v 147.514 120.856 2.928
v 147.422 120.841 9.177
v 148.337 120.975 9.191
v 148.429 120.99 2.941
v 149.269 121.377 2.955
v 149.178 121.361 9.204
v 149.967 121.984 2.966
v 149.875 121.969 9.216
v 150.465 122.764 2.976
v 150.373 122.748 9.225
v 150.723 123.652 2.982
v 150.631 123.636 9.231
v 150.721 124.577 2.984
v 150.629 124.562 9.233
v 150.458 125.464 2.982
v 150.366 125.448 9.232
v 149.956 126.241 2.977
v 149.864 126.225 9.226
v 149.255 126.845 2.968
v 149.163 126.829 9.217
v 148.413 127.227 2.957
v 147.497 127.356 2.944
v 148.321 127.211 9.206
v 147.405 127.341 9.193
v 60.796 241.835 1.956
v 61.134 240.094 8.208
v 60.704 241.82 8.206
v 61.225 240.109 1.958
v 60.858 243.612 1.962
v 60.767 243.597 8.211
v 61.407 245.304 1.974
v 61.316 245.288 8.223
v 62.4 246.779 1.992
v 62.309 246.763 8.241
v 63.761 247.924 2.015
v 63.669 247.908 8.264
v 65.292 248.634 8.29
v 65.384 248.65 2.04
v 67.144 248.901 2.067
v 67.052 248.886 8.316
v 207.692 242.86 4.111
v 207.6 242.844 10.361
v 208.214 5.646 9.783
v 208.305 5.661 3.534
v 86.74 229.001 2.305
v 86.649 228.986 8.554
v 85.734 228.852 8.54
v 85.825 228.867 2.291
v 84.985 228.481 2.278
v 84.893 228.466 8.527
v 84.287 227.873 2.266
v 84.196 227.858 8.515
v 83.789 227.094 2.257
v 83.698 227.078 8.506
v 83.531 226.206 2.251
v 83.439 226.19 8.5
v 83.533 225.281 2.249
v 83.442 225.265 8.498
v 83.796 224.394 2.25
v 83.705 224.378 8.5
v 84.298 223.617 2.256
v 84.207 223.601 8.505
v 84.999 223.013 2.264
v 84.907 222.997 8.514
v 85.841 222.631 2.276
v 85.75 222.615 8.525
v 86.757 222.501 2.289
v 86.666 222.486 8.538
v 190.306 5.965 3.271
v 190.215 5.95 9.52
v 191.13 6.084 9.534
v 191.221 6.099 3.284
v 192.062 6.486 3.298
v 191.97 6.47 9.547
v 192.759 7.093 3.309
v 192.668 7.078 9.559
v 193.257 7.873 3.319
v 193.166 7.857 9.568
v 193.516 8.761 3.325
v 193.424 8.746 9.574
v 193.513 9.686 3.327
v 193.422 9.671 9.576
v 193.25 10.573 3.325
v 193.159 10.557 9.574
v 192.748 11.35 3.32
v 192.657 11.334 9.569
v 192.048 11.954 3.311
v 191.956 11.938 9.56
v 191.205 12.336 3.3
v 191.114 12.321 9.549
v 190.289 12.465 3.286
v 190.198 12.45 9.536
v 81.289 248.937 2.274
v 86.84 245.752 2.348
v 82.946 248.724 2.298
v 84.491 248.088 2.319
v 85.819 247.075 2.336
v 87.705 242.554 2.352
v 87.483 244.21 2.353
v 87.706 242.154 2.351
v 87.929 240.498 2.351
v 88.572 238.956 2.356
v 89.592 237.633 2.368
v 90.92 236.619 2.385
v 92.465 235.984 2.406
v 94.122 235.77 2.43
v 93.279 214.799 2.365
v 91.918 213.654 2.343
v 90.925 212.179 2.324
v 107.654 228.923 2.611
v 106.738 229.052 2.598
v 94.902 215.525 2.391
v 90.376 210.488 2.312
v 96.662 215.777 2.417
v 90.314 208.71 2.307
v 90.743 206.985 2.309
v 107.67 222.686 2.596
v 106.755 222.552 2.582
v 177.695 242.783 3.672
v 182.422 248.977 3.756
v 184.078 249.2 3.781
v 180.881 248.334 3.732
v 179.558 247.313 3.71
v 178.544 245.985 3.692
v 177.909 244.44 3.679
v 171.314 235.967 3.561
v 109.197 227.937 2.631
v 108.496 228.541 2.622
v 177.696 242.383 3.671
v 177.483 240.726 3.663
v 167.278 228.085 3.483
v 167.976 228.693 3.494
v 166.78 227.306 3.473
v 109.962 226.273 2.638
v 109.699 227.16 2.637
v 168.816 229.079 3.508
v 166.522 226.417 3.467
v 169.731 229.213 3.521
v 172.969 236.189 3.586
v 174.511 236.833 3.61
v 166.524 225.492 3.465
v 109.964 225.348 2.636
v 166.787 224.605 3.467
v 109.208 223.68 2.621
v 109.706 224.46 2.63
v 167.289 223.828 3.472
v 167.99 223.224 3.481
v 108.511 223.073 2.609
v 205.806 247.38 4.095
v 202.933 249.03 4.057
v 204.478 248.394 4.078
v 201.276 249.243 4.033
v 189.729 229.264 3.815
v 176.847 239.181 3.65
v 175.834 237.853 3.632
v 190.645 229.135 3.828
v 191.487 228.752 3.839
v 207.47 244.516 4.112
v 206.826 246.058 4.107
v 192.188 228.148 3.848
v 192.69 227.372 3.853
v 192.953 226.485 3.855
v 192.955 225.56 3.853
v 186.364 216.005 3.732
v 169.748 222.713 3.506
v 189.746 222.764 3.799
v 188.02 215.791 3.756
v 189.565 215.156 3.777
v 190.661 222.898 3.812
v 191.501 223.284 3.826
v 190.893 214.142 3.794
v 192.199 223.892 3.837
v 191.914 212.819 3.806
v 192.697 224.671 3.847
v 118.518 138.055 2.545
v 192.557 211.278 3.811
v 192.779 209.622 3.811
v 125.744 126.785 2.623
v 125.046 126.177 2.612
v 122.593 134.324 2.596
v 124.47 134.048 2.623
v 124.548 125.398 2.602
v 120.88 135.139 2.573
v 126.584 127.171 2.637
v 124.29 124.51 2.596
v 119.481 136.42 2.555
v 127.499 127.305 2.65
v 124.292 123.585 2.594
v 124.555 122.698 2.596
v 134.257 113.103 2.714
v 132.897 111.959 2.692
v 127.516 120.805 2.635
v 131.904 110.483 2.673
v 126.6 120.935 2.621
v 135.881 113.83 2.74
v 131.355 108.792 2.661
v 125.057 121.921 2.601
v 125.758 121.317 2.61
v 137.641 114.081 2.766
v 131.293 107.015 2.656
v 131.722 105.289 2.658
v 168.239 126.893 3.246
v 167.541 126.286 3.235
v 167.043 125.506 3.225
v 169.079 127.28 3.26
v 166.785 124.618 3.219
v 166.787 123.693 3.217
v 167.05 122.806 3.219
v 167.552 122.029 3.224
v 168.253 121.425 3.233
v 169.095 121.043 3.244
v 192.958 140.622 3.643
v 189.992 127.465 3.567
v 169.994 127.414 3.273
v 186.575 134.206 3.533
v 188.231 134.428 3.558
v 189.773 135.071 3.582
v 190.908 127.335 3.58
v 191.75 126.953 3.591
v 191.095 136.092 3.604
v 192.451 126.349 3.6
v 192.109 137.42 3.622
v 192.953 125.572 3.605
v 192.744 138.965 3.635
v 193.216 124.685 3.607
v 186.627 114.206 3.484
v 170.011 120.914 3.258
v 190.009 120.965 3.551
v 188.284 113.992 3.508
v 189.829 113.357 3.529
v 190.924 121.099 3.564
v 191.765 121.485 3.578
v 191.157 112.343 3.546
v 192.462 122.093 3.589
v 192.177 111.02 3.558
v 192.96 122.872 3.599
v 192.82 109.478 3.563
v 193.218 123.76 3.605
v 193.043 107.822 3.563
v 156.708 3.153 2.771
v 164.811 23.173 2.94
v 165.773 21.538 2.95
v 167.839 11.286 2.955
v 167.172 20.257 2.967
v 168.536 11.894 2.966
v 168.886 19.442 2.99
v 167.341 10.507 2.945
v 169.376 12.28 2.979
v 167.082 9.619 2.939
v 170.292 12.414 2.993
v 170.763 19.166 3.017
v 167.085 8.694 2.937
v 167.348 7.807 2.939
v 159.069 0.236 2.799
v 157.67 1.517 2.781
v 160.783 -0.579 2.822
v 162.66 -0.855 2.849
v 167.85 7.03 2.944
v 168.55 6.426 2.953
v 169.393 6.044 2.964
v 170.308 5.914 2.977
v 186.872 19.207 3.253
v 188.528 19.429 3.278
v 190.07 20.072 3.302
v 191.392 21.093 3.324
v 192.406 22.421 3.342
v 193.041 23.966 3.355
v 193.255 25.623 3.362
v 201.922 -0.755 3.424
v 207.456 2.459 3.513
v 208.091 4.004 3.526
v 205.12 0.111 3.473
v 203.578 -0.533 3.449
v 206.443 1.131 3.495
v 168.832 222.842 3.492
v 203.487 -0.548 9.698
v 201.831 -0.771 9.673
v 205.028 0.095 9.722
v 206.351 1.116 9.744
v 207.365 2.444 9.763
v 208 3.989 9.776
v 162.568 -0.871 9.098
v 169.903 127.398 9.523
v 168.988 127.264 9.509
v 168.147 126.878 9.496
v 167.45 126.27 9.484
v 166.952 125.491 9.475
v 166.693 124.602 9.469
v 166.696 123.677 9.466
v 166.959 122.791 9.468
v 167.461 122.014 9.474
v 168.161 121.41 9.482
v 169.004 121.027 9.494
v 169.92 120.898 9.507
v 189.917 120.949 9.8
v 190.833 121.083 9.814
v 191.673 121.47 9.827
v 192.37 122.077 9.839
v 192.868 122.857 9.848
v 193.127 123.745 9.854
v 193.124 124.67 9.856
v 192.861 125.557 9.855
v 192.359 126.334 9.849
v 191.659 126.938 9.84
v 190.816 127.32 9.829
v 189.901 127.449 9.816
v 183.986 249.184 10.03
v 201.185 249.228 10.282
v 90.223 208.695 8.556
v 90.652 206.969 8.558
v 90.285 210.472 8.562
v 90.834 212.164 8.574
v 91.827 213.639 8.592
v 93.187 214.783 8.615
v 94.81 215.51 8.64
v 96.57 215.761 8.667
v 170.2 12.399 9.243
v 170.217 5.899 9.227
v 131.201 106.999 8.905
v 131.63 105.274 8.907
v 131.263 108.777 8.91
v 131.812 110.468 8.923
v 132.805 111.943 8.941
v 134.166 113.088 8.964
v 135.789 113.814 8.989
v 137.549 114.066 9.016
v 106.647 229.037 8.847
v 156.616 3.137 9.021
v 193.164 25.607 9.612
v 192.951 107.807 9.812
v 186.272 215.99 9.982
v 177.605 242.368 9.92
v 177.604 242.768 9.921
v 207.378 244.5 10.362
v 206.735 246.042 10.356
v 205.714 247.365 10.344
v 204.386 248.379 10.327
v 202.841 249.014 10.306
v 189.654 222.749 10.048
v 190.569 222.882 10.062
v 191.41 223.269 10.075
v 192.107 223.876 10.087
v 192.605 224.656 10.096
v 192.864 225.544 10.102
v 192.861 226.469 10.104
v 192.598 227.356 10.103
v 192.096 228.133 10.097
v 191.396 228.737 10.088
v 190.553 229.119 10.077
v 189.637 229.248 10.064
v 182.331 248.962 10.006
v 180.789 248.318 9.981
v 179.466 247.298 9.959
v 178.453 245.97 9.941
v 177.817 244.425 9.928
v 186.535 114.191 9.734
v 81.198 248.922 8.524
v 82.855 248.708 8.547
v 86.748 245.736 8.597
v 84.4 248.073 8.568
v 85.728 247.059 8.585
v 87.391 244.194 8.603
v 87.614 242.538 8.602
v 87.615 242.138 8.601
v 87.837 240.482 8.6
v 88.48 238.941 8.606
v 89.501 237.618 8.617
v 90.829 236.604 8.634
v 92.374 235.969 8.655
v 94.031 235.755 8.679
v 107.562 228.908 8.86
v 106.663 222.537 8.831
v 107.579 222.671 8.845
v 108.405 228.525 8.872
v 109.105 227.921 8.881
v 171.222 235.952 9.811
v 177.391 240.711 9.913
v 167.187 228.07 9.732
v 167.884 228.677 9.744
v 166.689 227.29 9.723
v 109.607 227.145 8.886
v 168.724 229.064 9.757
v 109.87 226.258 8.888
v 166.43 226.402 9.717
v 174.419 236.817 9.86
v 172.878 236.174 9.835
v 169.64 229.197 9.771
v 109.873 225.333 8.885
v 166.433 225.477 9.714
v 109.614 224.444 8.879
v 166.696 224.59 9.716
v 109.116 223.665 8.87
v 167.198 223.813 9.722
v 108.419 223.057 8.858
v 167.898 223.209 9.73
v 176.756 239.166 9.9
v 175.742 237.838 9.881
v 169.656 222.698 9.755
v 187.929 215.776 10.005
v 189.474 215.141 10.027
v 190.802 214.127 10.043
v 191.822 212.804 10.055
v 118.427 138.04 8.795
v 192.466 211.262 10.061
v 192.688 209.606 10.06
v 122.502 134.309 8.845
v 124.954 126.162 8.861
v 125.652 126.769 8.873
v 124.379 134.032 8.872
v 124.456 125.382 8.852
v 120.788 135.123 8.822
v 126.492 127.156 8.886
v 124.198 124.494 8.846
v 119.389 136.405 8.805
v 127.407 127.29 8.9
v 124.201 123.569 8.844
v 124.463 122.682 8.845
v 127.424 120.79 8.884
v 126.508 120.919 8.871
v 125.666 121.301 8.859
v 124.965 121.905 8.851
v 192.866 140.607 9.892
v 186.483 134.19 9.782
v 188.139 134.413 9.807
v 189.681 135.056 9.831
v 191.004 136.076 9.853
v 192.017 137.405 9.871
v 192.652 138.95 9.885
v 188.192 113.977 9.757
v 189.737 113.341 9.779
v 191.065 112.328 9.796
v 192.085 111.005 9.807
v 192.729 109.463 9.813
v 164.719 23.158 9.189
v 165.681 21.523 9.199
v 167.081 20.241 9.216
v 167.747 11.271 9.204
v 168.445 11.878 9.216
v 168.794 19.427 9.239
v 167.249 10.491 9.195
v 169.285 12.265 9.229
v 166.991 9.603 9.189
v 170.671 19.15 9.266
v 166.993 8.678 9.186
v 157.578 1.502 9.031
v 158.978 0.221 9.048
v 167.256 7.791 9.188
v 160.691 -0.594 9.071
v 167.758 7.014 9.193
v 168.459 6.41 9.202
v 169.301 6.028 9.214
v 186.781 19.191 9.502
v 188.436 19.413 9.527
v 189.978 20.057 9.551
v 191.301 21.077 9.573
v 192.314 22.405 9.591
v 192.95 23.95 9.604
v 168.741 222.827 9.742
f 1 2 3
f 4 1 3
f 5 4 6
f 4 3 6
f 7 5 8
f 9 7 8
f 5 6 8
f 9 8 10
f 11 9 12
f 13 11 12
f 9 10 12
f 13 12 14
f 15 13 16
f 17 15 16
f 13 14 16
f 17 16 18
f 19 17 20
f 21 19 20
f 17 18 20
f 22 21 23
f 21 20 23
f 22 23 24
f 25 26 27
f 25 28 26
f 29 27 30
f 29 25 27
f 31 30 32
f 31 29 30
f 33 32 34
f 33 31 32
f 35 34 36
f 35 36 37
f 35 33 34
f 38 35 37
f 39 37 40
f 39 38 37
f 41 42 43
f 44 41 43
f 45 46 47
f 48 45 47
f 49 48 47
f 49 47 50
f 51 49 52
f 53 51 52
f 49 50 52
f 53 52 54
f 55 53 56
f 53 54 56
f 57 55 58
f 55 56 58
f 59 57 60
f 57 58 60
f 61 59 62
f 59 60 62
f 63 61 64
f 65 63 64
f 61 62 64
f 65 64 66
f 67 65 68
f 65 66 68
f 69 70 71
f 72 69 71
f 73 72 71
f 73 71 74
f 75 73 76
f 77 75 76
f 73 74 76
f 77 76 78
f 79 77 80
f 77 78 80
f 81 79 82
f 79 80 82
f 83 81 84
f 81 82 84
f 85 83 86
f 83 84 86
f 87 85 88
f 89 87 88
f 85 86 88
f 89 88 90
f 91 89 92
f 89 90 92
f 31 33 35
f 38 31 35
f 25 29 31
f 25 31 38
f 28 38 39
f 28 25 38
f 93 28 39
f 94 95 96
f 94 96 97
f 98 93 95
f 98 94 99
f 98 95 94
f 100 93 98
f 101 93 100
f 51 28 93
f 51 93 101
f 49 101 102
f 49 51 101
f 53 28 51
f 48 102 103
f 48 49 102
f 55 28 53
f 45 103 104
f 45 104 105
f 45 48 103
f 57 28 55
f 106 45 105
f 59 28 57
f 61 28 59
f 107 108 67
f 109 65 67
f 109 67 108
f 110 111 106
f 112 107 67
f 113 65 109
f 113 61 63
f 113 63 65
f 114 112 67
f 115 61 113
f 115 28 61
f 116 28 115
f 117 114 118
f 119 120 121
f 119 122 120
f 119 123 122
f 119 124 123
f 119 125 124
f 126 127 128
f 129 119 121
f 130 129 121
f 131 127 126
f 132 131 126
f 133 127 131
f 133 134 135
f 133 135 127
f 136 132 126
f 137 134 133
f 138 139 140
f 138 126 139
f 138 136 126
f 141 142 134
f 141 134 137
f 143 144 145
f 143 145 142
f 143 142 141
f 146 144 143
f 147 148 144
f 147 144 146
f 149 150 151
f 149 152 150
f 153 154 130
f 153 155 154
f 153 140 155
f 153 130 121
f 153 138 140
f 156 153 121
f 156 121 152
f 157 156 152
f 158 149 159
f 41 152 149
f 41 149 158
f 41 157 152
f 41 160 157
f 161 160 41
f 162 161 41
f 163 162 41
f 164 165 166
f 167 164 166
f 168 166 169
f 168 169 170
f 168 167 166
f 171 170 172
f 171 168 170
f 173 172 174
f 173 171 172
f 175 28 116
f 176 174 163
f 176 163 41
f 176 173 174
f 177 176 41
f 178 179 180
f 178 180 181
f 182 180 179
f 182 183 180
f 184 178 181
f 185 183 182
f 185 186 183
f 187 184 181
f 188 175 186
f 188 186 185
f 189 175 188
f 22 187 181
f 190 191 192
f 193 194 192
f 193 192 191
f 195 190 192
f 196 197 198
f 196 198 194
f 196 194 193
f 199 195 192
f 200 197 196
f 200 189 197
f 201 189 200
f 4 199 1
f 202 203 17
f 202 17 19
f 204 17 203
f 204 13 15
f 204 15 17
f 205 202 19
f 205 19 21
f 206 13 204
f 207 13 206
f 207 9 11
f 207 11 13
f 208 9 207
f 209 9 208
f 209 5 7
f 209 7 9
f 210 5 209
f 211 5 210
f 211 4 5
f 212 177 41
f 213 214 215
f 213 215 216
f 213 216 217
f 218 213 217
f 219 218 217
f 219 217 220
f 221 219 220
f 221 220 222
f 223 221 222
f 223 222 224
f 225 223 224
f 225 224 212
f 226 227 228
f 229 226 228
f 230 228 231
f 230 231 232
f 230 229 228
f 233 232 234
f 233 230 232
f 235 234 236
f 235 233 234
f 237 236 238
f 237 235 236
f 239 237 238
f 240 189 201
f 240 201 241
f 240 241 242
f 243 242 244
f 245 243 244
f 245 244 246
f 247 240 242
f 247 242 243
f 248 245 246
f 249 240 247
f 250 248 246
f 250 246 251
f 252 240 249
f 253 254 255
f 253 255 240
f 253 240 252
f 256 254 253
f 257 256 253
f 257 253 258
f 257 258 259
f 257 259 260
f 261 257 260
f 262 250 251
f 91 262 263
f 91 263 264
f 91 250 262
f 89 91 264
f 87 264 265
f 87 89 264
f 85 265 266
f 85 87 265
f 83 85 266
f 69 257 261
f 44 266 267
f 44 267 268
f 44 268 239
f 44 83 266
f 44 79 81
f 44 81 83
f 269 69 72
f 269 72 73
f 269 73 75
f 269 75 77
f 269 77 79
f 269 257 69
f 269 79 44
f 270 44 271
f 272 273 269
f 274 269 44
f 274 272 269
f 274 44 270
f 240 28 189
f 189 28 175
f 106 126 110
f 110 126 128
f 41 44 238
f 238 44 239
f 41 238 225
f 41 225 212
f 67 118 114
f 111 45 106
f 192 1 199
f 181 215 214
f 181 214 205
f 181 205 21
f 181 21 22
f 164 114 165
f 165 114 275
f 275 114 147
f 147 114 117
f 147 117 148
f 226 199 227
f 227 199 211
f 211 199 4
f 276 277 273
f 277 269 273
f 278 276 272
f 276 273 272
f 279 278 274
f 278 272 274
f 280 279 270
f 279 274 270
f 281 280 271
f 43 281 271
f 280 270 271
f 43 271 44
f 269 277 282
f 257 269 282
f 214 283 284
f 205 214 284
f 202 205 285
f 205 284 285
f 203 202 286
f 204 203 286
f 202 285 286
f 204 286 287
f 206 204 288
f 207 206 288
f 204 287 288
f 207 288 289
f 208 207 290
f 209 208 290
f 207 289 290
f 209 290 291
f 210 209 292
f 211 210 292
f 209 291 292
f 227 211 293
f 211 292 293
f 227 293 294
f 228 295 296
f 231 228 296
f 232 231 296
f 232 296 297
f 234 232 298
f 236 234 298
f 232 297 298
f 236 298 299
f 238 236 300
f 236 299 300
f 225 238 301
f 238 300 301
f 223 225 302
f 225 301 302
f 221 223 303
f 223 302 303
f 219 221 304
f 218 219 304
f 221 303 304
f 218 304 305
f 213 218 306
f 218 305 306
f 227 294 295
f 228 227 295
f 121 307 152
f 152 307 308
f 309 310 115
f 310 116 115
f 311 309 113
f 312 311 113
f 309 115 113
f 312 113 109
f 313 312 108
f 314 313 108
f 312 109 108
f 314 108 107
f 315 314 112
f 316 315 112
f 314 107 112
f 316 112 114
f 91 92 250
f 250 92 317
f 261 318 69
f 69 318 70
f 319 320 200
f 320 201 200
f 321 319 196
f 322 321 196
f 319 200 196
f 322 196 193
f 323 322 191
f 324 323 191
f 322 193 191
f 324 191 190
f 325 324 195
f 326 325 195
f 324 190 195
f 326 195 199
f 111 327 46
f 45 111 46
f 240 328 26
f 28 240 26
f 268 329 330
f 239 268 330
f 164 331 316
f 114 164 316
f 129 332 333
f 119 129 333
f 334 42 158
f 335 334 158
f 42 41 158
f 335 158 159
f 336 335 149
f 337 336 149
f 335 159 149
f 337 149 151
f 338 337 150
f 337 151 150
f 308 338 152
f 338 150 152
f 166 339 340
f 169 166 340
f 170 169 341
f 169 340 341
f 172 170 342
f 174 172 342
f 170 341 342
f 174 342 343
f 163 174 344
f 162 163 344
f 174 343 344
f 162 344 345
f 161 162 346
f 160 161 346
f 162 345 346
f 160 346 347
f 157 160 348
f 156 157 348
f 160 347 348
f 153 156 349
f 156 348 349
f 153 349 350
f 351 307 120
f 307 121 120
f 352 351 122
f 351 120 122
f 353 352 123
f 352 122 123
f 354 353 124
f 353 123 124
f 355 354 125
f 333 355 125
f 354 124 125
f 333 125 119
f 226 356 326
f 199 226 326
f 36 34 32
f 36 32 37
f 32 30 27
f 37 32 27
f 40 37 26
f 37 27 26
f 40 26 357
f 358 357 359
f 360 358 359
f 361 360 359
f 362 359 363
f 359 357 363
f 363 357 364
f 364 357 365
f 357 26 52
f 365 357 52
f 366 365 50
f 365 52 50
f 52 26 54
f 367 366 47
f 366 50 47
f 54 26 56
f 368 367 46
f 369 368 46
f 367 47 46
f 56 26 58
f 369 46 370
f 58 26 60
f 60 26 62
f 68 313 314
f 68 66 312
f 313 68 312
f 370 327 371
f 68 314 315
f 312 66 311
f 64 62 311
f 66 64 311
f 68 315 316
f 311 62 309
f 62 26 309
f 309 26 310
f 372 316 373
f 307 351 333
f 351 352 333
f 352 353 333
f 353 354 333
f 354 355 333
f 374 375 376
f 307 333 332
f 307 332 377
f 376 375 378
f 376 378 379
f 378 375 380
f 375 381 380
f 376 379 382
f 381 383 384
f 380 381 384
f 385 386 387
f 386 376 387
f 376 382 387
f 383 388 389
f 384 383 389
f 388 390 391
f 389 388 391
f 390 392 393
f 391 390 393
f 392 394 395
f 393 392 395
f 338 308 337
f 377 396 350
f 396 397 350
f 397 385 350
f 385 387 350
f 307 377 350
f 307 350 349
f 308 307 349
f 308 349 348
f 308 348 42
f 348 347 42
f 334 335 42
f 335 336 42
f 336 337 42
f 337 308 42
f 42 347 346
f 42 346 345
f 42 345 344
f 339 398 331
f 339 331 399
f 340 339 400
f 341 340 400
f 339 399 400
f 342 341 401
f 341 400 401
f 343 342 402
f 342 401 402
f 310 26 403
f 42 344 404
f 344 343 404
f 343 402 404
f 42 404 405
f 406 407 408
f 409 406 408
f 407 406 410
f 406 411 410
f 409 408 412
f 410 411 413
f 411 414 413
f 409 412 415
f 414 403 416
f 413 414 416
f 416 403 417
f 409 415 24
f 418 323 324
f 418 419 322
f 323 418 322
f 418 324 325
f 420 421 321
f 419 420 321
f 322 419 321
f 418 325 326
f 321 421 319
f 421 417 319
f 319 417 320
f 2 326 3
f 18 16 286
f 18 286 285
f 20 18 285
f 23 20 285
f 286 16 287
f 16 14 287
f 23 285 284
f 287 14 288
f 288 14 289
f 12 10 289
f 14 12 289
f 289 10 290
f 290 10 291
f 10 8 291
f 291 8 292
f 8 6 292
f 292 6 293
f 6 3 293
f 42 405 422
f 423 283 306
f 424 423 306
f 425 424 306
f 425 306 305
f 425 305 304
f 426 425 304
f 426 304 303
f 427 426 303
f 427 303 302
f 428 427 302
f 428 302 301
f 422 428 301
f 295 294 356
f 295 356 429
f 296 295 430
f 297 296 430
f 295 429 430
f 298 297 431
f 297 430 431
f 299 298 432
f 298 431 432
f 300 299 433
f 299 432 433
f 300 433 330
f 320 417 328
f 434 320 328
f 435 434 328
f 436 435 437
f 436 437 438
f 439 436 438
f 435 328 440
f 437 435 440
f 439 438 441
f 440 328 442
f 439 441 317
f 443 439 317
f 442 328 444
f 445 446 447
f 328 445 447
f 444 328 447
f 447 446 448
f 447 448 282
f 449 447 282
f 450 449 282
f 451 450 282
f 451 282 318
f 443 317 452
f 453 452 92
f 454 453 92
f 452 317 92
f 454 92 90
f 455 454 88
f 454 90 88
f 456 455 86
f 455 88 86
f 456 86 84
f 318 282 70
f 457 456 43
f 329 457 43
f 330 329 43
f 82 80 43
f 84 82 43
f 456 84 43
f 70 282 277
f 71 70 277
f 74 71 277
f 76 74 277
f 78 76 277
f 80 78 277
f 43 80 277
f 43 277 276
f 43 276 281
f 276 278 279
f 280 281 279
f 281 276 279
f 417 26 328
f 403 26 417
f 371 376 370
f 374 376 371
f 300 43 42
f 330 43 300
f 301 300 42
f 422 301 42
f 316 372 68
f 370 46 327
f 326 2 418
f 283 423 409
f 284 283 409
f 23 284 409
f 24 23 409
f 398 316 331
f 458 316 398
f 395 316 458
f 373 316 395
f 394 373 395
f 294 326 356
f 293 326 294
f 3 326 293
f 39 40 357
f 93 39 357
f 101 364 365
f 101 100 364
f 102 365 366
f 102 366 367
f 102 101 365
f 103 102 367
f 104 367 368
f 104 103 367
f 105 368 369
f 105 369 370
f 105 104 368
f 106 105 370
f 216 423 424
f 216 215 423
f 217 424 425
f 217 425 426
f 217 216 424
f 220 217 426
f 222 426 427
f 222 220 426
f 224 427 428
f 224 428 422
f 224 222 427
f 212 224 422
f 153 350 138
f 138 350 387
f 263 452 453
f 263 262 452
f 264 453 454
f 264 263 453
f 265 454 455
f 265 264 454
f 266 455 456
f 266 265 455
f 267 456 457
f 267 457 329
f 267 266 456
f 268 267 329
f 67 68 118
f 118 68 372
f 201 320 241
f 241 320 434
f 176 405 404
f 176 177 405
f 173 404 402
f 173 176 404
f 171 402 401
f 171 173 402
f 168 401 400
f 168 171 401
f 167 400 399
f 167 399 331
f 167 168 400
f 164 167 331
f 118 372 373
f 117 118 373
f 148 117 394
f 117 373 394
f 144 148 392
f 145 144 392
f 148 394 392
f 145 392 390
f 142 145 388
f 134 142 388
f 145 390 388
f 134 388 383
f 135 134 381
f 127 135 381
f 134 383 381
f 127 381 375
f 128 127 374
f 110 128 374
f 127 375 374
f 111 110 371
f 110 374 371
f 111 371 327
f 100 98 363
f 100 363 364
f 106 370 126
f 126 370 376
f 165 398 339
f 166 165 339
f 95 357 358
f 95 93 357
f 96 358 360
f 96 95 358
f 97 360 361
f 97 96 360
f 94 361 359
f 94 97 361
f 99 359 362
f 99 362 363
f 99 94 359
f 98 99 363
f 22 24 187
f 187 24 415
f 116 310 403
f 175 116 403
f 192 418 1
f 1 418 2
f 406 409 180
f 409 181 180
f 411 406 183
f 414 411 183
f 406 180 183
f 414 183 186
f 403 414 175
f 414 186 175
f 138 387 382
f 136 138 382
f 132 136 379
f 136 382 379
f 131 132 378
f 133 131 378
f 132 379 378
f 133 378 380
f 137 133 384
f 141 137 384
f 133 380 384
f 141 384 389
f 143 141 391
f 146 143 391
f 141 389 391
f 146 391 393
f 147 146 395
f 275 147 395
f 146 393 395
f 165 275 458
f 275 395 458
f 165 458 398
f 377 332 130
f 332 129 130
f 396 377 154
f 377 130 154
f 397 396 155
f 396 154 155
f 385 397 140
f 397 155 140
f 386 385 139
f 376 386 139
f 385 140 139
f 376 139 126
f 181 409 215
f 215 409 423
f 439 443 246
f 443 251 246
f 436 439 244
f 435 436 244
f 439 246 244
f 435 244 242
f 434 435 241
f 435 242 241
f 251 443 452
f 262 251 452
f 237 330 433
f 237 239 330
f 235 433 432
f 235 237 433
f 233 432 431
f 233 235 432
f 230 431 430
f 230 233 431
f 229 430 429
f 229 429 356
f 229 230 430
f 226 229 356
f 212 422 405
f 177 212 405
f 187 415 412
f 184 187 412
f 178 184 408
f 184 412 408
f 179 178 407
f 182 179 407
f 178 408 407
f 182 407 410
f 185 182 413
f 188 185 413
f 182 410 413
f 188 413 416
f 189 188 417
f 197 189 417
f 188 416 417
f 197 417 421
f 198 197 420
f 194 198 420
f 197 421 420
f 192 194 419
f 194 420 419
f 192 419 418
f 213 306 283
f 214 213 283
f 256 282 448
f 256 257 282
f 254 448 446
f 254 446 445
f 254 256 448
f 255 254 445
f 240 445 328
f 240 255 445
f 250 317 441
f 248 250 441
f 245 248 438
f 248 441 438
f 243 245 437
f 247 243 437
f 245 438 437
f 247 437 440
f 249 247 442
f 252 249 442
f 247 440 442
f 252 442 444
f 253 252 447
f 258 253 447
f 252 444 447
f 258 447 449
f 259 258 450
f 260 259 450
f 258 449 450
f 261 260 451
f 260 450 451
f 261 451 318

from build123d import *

# Parameters (mm, degrees)
PAD_DEPTH              = 6.25
FILLET_R               = 6.4
MIRROR_ROLL_ANGLE      = -179.860361
MIRROR_PITCH_ANGLE     = 0.86933
MIRROR_PLACEMENT_ANGLE = 0.335531


with BuildPart() as body:
    # Sketch → Pad (new body)
    with BuildSketch(Plane.XY):
        Polygon((0, 250), (50, 250), (150, 0), (120, 0), (120, 13.2), (30, 13.2), (30, 0), (0, 0), align=None)
        Polygon((15, 230), (15, 135), (79.844506, 135), (41.844506, 230), align=None, mode=Mode.SUBTRACT)
        Polygon((15, 115), (15, 33.2), (120.564506, 33.2), (87.844506, 115), align=None, mode=Mode.SUBTRACT)
        with BuildLine():
            ThreePointArc((18, 243.25), (14.75, 240), (18, 236.75))
            Line((18, 236.75), (38, 236.75))
            ThreePointArc((38, 236.75), (41.25, 240), (38, 243.25))
            Line((38, 243.25), (18, 243.25))
        make_face(mode=Mode.SUBTRACT)
        with BuildLine():
            ThreePointArc((60.5, 128.25), (57.25, 125), (60.5, 121.75))
            Line((60.5, 121.75), (80.5, 121.75))
            ThreePointArc((80.5, 121.75), (83.75, 125), (80.5, 128.25))
            Line((80.5, 128.25), (60.5, 128.25))
        make_face(mode=Mode.SUBTRACT)
        with BuildLine():
            ThreePointArc((18, 128.25), (14.75, 125), (18, 121.75))
            Line((18, 121.75), (38, 121.75))
            ThreePointArc((38, 121.75), (41.25, 125), (38, 128.25))
            Line((38, 128.25), (18, 128.25))
        make_face(mode=Mode.SUBTRACT)
        with BuildLine():
            ThreePointArc((18, 26.45), (14.75, 23.2), (18, 19.95))
            Line((18, 19.95), (38, 19.95))
            ThreePointArc((38, 19.95), (41.25, 23.2), (38, 26.45))
            Line((38, 26.45), (18, 26.45))
        make_face(mode=Mode.SUBTRACT)
        with BuildLine():
            ThreePointArc((101, 26.45), (97.75, 23.2), (101, 19.95))
            Line((101, 19.95), (121, 19.95))
            ThreePointArc((121, 19.95), (124.25, 23.2), (121, 26.45))
            Line((121, 26.45), (101, 26.45))
        make_face(mode=Mode.SUBTRACT)
    extrude(amount=PAD_DEPTH)

    # Fillet
    fillet_edges = [body.edges().sort_by_distance(p)[0] for p in [
        (0, 0, 3.125),
        (50, 250, 3.125),
        (0, 250, 3.125),
        (150, 0, 3.125),
        (120, 0, 3.125),
        (30, 0, 3.125),
        (41.844506, 230, 3.125),
        (15, 230, 3.125),
        (87.844506, 115, 3.125),
        (15, 115, 3.125),
        (15, 135, 3.125),
        (15, 33.2, 3.125),
        (120.564506, 33.2, 3.125),
        (79.844506, 135, 3.125),
        (30, 13.2, 3.125),
        (120, 13.2, 3.125),
    ]]
    fillet(fillet_edges, radius=FILLET_R)


with BuildPart() as model_body_mirrored:
    # mirror: instance of Body
    add(body.part.mirror(Plane(origin=(159.181488, 124.226166, 5.790833), x_dir=(-0.001618, 0.999999, 0), z_dir=(-0.999887, -0.001617, 0.014919))))


with BuildPart() as model_body_mirrored_1:
    # mirror roll: moved
    add(model_body_mirrored.part.rotate(Axis((0, 0, 0), (1, 0, 0)), MIRROR_ROLL_ANGLE))


with BuildPart() as model_body_mirrored_2:
    # mirror pitch: moved
    add(model_body_mirrored_1.part.rotate(Axis((0, 0, 0), (0, 1, 0)), MIRROR_PITCH_ANGLE))


with BuildPart() as model_body_mirrored_3:
    # mirror placement: moved
    add(model_body_mirrored_2.part.moved(Location((-110.969424, 247.905415, 10.458181))).rotate(Axis((-110.969424, 247.905415, 10.458181), (0, 0, 1)), MIRROR_PLACEMENT_ANGLE))


solid = model_body_mirrored_3.part
